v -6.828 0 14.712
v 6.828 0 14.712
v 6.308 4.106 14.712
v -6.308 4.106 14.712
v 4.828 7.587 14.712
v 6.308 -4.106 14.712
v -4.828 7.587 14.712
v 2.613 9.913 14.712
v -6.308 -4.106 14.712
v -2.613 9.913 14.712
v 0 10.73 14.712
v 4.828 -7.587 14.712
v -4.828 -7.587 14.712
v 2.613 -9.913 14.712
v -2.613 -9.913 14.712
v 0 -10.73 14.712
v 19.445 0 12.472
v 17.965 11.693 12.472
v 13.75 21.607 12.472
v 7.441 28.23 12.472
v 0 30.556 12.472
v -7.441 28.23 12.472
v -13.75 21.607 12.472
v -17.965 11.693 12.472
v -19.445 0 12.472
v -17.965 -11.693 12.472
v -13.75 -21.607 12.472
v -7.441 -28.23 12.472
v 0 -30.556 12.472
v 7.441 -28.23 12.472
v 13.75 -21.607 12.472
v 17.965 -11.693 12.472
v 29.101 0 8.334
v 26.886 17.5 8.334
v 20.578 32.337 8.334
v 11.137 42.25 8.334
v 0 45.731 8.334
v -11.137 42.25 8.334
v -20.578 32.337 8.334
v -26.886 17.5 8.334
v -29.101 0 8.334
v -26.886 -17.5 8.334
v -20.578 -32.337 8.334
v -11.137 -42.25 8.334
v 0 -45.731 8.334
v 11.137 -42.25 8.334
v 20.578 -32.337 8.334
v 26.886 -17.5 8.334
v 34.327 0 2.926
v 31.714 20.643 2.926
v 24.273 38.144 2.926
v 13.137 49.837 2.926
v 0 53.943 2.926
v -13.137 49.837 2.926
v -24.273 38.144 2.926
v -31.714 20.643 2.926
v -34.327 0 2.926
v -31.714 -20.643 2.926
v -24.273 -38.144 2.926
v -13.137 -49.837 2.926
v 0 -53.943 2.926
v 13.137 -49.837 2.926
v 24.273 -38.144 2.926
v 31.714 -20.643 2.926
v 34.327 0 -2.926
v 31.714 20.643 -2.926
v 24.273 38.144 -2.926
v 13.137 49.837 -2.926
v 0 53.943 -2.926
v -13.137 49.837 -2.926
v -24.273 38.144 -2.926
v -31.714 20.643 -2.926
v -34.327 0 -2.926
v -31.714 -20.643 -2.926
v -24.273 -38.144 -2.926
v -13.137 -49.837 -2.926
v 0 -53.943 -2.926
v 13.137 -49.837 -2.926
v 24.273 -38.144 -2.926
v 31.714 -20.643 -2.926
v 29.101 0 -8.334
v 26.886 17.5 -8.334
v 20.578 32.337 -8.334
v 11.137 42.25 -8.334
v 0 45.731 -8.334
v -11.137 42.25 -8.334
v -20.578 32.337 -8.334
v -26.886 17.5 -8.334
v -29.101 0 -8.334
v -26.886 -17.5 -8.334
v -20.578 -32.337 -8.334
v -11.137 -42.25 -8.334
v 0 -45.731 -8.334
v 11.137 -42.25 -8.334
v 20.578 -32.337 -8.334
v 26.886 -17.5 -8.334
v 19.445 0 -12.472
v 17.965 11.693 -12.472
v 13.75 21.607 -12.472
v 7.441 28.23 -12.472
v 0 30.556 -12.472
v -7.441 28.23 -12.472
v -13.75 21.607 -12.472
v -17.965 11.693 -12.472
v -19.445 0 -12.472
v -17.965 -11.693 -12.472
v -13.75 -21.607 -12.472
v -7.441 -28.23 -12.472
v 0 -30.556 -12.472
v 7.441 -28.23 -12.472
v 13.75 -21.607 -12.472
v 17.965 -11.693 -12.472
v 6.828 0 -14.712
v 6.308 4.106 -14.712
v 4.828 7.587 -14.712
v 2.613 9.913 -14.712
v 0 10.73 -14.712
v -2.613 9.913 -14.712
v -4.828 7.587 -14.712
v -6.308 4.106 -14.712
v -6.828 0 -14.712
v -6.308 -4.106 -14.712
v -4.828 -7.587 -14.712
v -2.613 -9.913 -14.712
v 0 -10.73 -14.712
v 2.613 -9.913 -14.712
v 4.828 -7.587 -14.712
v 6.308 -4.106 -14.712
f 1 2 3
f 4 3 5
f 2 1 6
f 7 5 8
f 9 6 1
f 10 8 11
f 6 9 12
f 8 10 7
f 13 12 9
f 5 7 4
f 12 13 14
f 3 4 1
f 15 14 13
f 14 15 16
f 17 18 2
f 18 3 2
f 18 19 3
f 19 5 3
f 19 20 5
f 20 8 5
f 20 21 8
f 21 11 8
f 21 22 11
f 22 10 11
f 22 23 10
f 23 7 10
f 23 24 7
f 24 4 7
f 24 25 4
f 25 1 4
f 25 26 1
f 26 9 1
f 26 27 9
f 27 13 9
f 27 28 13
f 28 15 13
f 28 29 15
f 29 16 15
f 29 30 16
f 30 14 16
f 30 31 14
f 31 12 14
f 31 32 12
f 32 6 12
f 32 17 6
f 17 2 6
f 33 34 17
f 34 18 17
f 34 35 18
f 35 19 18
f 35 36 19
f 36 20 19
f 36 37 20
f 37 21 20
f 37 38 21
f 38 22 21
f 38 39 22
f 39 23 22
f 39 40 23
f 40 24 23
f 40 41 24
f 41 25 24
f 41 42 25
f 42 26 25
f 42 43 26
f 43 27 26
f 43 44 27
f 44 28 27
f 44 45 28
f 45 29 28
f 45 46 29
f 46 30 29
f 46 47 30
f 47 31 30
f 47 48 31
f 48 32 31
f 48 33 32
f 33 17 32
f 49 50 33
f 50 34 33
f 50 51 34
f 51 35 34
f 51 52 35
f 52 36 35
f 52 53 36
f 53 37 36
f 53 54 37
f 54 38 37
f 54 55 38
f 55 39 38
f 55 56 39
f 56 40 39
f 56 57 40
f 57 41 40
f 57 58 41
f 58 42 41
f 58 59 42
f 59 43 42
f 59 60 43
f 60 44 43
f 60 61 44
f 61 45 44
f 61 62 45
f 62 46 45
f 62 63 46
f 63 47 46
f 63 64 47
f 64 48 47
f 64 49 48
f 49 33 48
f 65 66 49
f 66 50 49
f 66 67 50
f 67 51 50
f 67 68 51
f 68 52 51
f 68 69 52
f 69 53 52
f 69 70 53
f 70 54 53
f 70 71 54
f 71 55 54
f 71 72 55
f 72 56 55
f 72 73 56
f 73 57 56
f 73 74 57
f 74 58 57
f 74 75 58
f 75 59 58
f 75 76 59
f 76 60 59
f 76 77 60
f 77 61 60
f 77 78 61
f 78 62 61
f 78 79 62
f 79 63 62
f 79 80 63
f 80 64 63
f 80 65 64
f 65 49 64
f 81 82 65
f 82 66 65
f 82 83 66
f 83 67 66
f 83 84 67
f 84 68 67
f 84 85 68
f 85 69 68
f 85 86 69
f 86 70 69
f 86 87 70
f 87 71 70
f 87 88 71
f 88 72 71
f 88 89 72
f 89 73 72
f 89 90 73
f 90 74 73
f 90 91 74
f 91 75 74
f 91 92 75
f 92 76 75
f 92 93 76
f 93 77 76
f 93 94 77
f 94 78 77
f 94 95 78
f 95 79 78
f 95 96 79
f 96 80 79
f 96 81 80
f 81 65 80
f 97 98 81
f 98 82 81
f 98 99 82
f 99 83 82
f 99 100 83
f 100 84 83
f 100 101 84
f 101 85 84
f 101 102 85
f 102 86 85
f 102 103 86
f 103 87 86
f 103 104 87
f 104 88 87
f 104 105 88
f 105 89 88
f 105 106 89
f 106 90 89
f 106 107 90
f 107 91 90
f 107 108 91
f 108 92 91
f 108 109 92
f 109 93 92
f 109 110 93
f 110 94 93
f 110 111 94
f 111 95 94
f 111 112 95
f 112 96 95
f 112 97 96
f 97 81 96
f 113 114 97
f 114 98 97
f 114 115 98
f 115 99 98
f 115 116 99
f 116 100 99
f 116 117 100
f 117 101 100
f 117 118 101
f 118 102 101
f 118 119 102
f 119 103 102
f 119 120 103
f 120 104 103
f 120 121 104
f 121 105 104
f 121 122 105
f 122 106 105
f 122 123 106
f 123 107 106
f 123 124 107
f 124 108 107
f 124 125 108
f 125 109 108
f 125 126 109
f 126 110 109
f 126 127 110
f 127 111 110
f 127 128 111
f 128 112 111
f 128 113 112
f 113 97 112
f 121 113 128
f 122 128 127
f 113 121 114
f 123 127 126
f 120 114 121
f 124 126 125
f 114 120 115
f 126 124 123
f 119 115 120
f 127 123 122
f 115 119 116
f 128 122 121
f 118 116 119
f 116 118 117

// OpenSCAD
// Generated by SolidPython 1.0.1 on 2020-07-29 00:46:47


scale(v = [7, 11, 3]) {
	sphere(r = 5);
}
/***********************************************
*********      SolidPython code:      **********
************************************************
 
# import packages: SolidPython
from solid import *
from solid.utils import *
from itertools import chain, combinations, permutations


class Resize:

    def __init__(self, scad_file):
        self.scad_file = scad_file
        #self.scad_file = import_scad(scad_file)
        # cone/cylinder param:
        self.r1 = 0
        self.r2 = 0
        self.h = 0
        # rectangular prism param:
        self.w = 0
        self.l = 0
        # ellipse param:
        self.r = 0

    # import OpenScad code (file name corresponds to shape)


    # classify shape + parameters
    def assign(self, param1, param2, param3):
        if self.scad_file == 'cone.scad':
            self.r1 = param1
            self.r2 = param2
            self.h = param3
        elif self.scad_file == 'cylinder.scad':
            self.r1 = param1
            self.r2 = param2
            self.h = param3
        elif self.scad_file == 'rectangularPrism.scad':
            self.h = param1
            self.l = param2
            self.w = param3
        else:
            self.r = param1
            self.h = param2

    # resize parameters
    def iterate(self):
        x = range(3, 20, 2)
        i = 1
        if self.scad_file == 'cone.scad':
            tempList = list(permutations(x, 2))
            for temp in tempList:
                param1 = temp[0]
                param2 = temp[1]
                filepath = 'produced_scad_files/' + 'cone' + str(param1) + '_' + str(param2) + '_' + '.scad'
                scad_render_to_file(cylinder(h=param1, r1=param2, r2=0), filepath)

        elif self.scad_file == 'cylinder.scad':
            tempList = list(permutations(x, 3))
            for temp in tempList:
                param1 = temp[0]
                param2 = temp[1]
                filepath = 'produced_scad_files/' + 'cylinder' + str(param1) + '_' + str(param2) + '_' + '.scad'
                scad_render_to_file(cylinder(h=param1, r1=param2, r2=param2), filepath)

        elif self.scad_file == 'rectangularPrism.scad':
            tempList = list(permutations(x, 3))
            for temp in tempList:
                param1 = temp[0]
                param2 = temp[1]
                param3 = temp[2]
                filepath = 'produced_scad_files/' + 'rectangularPrism' + str(param1) + '_' + str(param2) + '_' + str(
                    param3) + '.scad'
                scad_render_to_file(cube(size=(param1, param2, param3)), filepath)

        elif self.scad_file == 'ellipse.scad':
            tempList = list(permutations(x, 4))
            for temp in tempList:
                param1 = temp[0]
                param2 = temp[1]
                param3 = temp[2]
                param4 = temp[3]
                filepath = 'produced_scad_files/' + 'ellipse' + str(param1) + '_' + str(param2) + '_' + str(param3) + '_' + str(param4) + '.scad'
                scad_render_to_file(scale([param1, param2, param3])(sphere(r=param4)), filepath)

    def render_to_scadfile(self):
        scad_render_to_file(scad, 'example.scad') 
 
************************************************/
